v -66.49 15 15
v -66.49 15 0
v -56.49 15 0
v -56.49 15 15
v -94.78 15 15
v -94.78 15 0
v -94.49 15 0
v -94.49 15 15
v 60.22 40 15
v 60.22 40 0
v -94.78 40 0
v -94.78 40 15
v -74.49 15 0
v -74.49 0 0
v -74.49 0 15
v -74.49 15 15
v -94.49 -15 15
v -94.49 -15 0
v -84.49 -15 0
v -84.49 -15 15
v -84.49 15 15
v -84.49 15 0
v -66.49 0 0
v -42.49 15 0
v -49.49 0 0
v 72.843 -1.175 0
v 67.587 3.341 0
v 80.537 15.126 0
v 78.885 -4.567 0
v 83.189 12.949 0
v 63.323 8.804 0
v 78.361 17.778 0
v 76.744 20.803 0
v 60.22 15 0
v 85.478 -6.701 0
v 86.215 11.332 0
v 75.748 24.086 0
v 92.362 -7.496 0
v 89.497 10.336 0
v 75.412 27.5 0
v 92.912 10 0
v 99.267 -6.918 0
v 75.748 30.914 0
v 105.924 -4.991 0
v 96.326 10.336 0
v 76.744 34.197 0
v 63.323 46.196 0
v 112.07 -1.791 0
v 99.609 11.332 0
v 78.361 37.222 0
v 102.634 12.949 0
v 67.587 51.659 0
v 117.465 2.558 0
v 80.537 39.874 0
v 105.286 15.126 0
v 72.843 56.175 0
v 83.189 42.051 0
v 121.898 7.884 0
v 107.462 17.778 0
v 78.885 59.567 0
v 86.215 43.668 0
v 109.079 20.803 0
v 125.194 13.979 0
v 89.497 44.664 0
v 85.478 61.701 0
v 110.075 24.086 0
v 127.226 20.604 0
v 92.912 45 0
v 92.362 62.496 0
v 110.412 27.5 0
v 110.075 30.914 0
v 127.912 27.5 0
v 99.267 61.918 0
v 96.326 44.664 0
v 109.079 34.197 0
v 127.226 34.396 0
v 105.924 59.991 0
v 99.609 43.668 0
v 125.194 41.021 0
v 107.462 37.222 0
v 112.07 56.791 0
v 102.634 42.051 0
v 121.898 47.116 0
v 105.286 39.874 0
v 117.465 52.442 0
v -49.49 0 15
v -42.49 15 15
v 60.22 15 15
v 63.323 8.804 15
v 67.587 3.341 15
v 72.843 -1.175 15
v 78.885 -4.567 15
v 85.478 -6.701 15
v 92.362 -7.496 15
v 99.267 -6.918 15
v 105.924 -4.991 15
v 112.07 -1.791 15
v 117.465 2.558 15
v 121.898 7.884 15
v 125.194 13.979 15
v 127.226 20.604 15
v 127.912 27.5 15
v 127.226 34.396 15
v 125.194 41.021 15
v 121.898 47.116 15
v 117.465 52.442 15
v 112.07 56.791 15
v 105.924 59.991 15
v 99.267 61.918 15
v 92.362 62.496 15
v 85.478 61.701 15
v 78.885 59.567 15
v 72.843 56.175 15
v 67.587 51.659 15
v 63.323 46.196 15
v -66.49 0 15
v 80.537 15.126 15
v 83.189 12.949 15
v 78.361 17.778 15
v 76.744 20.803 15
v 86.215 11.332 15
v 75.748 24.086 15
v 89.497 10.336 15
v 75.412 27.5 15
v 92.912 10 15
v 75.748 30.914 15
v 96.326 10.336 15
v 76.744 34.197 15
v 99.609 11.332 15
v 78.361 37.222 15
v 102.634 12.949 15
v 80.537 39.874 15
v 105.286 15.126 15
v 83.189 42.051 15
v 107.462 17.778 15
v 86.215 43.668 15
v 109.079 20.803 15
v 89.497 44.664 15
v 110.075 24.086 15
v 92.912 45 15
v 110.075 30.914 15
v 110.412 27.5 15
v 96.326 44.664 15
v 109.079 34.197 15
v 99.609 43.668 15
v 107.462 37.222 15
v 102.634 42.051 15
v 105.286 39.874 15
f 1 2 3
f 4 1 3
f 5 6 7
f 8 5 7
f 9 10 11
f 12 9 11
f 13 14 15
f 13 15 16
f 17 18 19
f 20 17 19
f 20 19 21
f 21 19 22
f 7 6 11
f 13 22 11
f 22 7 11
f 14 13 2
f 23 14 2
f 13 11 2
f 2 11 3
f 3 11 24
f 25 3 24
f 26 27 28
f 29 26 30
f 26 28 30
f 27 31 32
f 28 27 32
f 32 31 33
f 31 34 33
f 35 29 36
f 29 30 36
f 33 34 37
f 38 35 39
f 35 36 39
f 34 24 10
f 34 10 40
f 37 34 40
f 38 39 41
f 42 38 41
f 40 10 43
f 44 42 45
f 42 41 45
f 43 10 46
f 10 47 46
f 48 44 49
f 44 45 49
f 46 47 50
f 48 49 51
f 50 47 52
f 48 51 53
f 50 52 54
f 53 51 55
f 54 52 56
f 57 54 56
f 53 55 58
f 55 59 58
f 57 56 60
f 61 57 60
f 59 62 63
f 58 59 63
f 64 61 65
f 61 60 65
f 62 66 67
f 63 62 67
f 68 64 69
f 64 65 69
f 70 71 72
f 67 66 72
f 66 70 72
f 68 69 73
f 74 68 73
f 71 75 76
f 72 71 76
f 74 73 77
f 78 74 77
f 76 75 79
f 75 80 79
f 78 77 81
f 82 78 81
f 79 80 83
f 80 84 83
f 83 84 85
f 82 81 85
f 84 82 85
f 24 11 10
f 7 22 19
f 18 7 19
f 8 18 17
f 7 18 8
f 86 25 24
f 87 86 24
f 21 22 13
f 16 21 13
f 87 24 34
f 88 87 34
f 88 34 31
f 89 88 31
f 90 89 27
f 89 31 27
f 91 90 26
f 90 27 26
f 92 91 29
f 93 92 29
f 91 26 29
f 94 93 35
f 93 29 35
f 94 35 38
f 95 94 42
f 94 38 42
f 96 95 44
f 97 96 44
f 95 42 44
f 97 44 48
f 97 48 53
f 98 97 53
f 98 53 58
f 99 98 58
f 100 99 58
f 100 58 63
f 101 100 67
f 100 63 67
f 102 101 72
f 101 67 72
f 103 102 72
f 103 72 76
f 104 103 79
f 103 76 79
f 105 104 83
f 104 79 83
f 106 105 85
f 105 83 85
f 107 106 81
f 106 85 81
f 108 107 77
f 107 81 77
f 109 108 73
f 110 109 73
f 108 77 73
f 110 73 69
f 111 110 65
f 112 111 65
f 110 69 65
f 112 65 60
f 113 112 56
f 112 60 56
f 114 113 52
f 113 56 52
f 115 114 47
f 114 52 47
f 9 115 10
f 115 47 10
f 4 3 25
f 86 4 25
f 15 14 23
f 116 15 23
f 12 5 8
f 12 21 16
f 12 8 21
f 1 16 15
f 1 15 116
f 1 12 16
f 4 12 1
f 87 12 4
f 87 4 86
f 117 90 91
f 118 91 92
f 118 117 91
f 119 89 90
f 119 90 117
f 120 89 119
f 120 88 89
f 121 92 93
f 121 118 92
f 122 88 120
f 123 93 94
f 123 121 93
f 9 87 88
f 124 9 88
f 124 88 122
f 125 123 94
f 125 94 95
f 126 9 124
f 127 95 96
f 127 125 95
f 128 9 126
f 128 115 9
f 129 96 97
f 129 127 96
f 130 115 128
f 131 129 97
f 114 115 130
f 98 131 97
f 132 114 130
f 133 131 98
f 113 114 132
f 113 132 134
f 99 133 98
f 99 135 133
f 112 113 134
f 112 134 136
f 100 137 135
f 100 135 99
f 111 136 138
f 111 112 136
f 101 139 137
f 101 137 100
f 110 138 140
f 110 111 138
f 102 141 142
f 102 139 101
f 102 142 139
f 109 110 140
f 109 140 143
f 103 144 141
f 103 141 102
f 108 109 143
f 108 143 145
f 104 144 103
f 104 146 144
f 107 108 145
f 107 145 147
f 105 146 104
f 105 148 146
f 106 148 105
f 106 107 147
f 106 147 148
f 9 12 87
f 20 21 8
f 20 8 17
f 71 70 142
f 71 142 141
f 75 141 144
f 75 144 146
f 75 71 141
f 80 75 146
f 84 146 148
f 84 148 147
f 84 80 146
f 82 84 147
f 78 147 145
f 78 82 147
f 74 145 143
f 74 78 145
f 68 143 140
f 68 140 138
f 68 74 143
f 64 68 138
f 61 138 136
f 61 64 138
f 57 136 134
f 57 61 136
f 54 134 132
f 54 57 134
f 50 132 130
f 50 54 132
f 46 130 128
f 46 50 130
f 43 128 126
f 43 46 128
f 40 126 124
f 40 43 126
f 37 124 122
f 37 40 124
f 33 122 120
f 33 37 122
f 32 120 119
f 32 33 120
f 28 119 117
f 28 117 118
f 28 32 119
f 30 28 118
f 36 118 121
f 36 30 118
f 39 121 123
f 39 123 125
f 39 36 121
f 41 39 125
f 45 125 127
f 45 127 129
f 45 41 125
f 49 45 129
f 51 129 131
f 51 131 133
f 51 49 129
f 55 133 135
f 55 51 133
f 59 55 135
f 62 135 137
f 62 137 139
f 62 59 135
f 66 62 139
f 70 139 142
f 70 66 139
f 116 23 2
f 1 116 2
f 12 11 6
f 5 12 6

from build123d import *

# Parameters (mm, degrees)
F0_R     = 17.5
F0_W     = 10
F0_H     = 30
F0_W_2   = 8
F0_H_2   = 15
F1_DEPTH = 15


# Not quite as in the source:
# - a feature of the source that left no trace in its solid (it failed there, or was rolled back) is left out


with BuildPart() as f1:
    # F0 (on Top) → F1 (new body)
    with BuildSketch(Plane.XY):
        with BuildLine():
            Line((60.2198065221, 40), (-94.7801934779, 40))
            Line((-94.7801934779, 40), (-94.7801934779, 15))
            Line((-94.7801934779, 15), (-94.4899649718, 15))
            Line((-94.4899649718, 15), (-84.4899649718, 15))
            Line((-84.4899649718, 15), (-74.4899649718, 15))
            Line((-74.4899649718, 15), (-66.4899649718, 15))
            Line((-66.4899649718, 15), (-56.4899649718, 15))
            Line((-56.4899649718, 15), (-42.4899649718, 15))
            Line((-42.4899649718, 15), (60.2198065221, 15))
            ThreePointArc((60.2198065221, 15), (127.9115485987, 27.5), (60.2198065221, 40))
        make_face()
        with Locations((92.9115485987, 27.5)):
            Circle(F0_R, mode=Mode.SUBTRACT)
        with Locations((-89.4899649718, 0)):
            Rectangle(F0_W, F0_H)
        with Locations((-70.4899649718, 7.5)):
            Rectangle(F0_W_2, F0_H_2)
        Polygon((-49.4899649718, 0), (-42.4899649718, 15), (-56.4899649718, 15), align=None)
    extrude(amount=F1_DEPTH)


solid = f1.part
